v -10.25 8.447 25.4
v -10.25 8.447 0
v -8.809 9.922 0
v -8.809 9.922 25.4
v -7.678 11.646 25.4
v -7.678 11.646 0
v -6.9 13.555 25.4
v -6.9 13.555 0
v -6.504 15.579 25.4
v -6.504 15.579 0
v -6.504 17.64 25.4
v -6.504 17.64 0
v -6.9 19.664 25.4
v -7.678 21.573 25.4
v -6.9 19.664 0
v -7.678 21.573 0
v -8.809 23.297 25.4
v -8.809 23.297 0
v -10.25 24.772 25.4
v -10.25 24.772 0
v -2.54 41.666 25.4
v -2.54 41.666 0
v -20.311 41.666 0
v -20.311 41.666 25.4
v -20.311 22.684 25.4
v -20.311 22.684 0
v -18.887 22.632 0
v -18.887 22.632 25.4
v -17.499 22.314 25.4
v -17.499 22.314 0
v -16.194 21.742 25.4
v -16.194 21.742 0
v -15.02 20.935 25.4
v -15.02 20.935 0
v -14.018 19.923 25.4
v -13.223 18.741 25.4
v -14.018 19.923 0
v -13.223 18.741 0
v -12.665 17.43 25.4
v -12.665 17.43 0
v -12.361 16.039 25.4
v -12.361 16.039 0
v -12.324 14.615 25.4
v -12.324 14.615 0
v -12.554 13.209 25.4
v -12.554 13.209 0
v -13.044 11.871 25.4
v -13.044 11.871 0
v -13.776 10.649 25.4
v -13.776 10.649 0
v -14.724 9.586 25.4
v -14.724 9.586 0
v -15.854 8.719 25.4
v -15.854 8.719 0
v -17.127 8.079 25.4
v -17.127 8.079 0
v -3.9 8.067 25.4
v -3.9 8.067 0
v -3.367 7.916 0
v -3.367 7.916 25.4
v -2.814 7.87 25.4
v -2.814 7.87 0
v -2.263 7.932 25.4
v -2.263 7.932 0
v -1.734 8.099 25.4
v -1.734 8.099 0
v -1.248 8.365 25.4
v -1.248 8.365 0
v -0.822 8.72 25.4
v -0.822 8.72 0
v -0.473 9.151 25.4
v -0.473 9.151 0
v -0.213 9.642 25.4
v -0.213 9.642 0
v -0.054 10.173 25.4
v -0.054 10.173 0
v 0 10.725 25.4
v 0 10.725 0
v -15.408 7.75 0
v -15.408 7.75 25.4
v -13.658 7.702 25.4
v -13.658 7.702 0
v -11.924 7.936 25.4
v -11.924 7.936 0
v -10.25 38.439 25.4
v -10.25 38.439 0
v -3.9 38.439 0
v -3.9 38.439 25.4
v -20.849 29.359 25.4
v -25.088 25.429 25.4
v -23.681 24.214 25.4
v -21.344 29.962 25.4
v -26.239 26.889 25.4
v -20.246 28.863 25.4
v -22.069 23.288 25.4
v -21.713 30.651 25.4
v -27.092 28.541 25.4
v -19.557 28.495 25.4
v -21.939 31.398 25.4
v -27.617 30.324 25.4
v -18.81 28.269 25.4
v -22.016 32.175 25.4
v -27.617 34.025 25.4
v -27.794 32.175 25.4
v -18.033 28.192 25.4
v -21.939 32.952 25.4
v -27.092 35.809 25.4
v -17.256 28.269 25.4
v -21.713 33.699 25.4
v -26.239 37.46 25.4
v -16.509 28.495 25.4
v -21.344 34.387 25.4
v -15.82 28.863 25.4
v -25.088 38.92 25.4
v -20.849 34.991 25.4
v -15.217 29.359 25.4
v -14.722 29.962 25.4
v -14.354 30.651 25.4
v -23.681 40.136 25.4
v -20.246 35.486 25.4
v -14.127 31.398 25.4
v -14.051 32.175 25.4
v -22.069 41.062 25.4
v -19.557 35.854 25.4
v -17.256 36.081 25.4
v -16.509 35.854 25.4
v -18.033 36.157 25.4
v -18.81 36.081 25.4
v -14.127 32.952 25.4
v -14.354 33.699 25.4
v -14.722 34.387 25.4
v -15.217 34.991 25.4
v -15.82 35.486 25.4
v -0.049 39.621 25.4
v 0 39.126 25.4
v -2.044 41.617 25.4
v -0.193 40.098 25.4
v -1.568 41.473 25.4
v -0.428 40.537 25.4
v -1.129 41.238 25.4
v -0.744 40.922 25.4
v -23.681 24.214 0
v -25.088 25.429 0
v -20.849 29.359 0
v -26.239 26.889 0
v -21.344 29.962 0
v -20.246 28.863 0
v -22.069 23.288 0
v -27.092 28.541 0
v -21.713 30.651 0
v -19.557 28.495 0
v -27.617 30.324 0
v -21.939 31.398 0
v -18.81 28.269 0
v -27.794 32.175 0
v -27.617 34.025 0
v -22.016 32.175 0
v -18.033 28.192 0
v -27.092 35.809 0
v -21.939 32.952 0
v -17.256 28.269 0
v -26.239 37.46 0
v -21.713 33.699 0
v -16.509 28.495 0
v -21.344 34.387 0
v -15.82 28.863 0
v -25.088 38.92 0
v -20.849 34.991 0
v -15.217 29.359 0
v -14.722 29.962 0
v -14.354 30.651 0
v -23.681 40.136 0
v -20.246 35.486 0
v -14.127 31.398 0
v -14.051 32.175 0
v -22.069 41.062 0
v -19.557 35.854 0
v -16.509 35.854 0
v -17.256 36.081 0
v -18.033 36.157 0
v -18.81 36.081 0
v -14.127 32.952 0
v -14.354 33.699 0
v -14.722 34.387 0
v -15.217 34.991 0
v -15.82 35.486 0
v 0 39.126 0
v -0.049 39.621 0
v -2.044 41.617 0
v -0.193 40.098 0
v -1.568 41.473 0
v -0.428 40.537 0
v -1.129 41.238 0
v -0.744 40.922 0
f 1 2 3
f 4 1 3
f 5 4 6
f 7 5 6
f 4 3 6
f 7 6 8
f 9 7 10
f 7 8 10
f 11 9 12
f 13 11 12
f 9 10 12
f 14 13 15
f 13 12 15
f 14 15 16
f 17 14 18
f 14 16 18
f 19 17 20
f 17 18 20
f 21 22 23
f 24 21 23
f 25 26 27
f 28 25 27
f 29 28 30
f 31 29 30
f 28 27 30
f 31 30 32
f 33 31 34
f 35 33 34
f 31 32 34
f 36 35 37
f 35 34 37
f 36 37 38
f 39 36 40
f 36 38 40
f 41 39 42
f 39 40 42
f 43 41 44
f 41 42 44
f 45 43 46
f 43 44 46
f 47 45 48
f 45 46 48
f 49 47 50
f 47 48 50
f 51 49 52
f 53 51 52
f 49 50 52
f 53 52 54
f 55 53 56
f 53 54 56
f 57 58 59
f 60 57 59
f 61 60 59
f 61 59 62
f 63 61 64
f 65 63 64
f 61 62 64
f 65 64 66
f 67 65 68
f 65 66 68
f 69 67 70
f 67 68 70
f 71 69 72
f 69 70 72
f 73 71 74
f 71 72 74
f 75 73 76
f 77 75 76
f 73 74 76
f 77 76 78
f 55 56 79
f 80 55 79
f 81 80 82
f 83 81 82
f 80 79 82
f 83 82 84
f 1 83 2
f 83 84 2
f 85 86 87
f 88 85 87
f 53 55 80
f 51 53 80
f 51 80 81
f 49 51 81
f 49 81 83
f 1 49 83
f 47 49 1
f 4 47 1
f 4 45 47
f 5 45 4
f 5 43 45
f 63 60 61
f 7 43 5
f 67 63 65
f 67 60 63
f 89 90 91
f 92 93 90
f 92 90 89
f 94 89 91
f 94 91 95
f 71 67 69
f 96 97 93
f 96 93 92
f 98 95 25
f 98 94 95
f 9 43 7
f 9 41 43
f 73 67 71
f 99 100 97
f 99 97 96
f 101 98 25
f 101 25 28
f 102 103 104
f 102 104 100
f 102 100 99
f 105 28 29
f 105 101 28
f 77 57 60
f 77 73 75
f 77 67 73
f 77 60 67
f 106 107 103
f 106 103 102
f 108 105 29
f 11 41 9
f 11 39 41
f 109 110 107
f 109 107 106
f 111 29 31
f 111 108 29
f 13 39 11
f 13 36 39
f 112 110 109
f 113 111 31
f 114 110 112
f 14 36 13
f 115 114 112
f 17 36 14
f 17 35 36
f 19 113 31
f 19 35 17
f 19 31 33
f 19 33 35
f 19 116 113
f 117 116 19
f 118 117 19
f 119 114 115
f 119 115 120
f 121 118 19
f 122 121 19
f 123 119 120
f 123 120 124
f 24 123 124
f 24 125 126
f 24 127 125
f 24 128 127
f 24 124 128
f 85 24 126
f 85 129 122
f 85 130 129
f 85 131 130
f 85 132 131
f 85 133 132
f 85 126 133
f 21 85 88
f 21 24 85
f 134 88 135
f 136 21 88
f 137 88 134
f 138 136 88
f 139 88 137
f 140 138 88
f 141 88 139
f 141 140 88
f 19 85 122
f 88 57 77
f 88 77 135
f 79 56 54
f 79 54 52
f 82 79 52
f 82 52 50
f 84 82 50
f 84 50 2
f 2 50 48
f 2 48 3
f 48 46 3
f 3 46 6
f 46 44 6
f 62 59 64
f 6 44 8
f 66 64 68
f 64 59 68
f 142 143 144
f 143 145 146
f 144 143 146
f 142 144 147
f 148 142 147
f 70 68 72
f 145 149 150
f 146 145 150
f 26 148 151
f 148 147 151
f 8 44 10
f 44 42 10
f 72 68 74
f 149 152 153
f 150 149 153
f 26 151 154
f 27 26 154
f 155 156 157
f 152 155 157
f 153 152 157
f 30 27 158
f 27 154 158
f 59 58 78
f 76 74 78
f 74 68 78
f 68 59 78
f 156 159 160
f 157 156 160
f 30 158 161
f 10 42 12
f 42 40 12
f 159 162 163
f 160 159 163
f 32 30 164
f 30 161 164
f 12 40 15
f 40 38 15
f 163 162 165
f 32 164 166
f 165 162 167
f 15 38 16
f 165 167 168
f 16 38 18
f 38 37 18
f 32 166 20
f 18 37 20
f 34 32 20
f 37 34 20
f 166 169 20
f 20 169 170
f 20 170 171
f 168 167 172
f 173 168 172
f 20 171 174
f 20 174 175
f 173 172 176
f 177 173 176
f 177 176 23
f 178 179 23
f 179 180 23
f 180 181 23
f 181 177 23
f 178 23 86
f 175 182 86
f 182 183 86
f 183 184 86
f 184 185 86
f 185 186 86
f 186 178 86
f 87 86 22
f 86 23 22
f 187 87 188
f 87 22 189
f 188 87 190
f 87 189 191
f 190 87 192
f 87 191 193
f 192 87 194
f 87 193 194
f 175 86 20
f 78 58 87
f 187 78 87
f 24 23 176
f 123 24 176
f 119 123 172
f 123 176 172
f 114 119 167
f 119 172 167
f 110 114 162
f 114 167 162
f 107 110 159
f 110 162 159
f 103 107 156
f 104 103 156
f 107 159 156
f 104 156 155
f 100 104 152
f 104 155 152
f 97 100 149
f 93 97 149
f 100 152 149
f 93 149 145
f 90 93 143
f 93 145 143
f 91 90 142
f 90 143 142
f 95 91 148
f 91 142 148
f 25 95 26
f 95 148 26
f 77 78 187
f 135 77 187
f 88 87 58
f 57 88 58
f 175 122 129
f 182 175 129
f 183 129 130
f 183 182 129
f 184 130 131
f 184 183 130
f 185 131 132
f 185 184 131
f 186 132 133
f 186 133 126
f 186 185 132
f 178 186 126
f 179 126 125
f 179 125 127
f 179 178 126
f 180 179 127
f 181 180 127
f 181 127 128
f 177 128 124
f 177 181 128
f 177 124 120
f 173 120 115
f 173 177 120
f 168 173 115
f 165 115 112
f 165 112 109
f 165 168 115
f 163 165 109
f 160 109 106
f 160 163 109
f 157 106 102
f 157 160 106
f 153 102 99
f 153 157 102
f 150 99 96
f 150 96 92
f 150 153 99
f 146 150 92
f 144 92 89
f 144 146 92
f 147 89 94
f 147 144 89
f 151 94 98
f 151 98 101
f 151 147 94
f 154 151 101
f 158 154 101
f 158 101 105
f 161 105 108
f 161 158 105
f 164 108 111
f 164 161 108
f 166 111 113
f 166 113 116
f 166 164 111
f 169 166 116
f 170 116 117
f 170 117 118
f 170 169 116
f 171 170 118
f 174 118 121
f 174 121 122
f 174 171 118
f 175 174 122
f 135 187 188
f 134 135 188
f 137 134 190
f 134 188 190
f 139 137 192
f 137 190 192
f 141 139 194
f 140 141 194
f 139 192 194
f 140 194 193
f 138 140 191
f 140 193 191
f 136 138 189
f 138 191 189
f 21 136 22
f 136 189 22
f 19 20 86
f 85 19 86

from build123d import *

# Parameters (mm, degrees)
F0_R     = 3.982588
F1_DEPTH = 25.4


with BuildPart() as f1:
    # F0 (on Top) → F1 (new body)
    with BuildSketch(Plane.XY):
        with BuildLine():
            ThreePointArc((-10.250391, 8.447082), (-6.45395, 16.609431), (-10.250391, 24.77178))
            Line((-10.250391, 24.77178), (-10.250391, 38.438968))
            Line((-10.250391, 38.438968), (-3.900391, 38.438968))
            Line((-3.900391, 38.438968), (-3.900391, 8.067437))
            ThreePointArc((-3.900391, 8.067437), (-1.247671, 8.365105), (0, 10.724947))
            Line((0, 10.724947), (0, 39.125941))
            ThreePointArc((0, 39.125941), (-0.743949, 40.921993), (-2.54, 41.665941))
            Line((-2.54, 41.665941), (-20.310961, 41.665941))
            ThreePointArc((-20.310961, 41.665941), (-27.793714, 32.174841), (-20.310961, 22.68374))
            ThreePointArc((-20.310961, 22.68374), (-12.479962, 16.741734), (-17.126696, 8.07918))
            ThreePointArc((-17.126696, 8.07918), (-13.658499, 7.701584), (-10.250391, 8.447082))
        make_face()
        with Locations((-18.033097, 32.174841)):
            Circle(F0_R, mode=Mode.SUBTRACT)
    extrude(amount=F1_DEPTH)


solid = f1.part
